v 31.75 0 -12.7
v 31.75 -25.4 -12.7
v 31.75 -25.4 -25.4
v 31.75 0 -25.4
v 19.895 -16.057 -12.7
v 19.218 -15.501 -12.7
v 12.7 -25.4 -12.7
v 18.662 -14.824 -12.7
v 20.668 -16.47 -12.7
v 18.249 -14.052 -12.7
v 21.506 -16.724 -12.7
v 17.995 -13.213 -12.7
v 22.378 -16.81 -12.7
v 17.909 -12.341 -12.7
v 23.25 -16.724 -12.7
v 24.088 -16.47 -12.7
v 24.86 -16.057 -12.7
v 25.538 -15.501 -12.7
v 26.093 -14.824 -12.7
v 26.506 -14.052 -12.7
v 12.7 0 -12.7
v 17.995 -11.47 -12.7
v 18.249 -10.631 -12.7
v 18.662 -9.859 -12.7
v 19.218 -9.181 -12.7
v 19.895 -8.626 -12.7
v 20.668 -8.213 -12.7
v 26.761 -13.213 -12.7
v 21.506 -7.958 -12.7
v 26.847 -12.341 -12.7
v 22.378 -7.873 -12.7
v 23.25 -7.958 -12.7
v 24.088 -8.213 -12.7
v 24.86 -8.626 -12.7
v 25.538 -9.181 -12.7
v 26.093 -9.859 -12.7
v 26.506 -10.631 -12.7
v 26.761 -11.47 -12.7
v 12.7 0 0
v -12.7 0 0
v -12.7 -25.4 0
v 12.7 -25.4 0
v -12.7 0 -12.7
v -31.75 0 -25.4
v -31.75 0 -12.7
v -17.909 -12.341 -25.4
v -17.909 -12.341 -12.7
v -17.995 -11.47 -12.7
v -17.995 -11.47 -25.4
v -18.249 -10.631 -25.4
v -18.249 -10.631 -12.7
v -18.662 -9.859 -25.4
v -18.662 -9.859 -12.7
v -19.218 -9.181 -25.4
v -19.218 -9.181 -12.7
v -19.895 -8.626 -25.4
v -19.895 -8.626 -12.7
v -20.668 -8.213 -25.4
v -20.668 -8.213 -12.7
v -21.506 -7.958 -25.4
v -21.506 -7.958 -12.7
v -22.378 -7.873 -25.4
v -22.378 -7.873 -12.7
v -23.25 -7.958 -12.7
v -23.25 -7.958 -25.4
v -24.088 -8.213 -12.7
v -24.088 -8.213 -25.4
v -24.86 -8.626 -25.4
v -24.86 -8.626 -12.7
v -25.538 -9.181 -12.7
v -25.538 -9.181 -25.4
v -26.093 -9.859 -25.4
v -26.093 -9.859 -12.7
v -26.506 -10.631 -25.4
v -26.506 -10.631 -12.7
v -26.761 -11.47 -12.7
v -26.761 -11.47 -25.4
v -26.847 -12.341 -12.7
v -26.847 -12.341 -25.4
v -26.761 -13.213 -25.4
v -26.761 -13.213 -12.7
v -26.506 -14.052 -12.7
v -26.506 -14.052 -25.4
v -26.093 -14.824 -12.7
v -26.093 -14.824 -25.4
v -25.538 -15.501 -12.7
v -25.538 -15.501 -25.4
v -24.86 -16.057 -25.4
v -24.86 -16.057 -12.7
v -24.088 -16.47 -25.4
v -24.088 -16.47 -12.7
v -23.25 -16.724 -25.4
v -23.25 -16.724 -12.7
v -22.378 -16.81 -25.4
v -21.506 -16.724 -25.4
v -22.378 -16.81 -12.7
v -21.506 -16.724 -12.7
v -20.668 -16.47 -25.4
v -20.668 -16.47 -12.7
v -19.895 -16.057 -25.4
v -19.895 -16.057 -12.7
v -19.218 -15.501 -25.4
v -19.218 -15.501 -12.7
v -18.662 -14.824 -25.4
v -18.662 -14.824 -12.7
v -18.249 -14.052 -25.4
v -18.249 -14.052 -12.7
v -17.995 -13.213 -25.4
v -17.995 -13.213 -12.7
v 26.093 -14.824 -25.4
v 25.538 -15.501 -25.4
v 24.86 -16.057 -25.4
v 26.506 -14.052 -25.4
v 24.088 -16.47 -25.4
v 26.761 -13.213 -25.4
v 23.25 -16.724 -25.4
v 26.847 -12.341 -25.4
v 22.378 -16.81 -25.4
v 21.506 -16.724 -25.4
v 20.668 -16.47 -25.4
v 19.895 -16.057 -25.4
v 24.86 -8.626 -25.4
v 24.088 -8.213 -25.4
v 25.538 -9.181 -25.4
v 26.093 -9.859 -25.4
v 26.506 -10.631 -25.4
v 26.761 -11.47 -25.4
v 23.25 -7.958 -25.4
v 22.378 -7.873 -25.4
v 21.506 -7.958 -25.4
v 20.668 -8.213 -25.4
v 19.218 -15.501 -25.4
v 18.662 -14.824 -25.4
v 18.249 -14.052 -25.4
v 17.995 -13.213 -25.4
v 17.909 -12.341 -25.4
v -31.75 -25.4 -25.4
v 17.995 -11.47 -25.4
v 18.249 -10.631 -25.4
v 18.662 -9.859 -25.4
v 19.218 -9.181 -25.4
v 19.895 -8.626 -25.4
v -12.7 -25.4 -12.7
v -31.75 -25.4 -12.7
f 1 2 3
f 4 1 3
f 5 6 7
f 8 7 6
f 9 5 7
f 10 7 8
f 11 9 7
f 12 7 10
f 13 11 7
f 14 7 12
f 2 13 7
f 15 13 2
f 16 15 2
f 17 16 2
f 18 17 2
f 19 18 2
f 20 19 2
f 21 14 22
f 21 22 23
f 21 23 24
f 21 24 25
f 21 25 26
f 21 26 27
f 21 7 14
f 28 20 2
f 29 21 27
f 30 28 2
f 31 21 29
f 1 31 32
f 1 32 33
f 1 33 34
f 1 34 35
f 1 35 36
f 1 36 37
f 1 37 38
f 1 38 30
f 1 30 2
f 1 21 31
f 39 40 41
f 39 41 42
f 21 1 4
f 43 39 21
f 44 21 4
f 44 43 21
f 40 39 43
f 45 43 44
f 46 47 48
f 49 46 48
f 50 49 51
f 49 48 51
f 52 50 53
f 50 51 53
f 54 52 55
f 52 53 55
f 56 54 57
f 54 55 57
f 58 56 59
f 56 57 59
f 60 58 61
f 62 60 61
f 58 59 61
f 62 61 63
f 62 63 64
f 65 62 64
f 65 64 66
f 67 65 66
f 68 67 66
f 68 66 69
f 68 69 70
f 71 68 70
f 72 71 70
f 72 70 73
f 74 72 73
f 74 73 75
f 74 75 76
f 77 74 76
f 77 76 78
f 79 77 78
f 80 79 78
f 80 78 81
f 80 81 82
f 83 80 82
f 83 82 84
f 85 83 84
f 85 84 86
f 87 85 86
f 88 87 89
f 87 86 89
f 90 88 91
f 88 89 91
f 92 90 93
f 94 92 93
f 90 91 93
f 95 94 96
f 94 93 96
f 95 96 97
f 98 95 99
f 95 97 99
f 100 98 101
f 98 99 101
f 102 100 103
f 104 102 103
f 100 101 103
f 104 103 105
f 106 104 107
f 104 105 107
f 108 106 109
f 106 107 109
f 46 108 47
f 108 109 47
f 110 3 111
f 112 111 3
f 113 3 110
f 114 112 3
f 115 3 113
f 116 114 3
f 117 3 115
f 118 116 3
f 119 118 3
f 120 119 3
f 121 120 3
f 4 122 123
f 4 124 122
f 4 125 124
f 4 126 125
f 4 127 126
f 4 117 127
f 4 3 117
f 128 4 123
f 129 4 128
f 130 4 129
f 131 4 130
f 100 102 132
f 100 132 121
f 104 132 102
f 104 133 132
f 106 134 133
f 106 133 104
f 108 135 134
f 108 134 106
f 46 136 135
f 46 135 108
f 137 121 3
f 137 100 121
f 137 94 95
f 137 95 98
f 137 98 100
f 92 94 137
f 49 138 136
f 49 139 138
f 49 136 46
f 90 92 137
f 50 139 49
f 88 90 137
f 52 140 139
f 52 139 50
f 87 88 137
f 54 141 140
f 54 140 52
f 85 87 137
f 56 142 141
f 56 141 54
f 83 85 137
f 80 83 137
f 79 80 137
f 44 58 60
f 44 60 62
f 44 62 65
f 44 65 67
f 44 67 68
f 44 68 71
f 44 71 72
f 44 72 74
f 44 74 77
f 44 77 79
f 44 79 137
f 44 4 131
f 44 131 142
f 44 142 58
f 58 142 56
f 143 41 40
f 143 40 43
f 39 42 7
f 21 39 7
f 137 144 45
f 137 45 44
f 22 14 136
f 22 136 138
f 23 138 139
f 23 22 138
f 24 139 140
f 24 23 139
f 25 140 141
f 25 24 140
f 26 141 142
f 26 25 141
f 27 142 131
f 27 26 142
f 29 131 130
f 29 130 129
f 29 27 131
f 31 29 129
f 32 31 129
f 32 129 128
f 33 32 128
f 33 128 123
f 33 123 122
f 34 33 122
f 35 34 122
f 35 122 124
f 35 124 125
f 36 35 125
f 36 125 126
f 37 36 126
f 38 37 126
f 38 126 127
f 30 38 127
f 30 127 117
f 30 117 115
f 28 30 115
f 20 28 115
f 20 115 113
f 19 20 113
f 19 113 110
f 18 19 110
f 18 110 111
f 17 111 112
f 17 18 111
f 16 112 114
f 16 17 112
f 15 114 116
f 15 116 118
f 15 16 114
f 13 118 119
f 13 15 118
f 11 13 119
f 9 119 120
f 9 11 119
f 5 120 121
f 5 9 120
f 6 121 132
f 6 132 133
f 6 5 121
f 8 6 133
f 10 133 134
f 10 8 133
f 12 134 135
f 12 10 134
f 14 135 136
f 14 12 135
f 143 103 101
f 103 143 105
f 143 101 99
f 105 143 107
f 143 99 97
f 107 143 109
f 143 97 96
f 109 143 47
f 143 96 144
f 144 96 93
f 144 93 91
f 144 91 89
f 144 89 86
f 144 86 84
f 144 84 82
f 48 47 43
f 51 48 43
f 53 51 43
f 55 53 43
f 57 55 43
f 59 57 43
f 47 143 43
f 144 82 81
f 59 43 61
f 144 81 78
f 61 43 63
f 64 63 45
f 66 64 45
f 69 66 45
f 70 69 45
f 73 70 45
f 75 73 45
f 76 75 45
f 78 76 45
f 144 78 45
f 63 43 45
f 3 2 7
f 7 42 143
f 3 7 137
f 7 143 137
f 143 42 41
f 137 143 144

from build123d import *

# Parameters (mm, degrees)
F1_DEPTH = 25.4
F2_R     = 4.468901
F3_DEPTH = 25.4


with BuildPart() as f1:
    # F0 (on Front) → F1 (new body)
    with BuildSketch(Plane.XZ):
        Polygon((0, -25.4), (0, 0), (-12.7, 0), (-12.7, -12.7), (-31.75, -12.7), (-31.75, -25.4), align=None)
    extrude(amount=F1_DEPTH)

    # F2 (on face) → F3 (cut)
    with BuildSketch(Plane.XY.offset(-12.7)):
        with Locations((-22.377703, -12.341406)):
            Circle(F2_R)
    extrude(amount=-F3_DEPTH, mode=Mode.SUBTRACT)

    # F4: F1 across plane


with BuildPart() as f1_1:
    add(f1.part)
    add(f1.part.mirror(Plane.YZ))


solid = f1_1.part
